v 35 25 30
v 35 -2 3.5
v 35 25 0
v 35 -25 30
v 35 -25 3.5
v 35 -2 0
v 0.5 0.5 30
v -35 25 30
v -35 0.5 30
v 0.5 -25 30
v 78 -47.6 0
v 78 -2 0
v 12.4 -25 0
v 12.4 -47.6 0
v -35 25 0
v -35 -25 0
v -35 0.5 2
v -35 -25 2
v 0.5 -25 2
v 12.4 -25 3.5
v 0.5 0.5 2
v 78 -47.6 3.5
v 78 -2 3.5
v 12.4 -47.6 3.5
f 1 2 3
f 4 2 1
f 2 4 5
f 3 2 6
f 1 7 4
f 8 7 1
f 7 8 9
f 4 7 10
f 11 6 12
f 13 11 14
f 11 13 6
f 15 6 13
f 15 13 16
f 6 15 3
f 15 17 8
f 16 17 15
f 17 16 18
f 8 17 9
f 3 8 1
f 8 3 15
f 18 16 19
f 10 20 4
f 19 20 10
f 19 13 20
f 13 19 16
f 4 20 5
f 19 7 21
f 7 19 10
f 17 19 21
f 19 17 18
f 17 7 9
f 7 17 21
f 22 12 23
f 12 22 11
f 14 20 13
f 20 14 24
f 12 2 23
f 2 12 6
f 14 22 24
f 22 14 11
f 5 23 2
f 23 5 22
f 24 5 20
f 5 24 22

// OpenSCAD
// Two-part enclosure for small electronics board (e.g., Arduino-based temp logger)
// Both parts printed in the same file, side by side on the bed, 10 mm gap.

// ---------- Parameters ----------
box_x      = 70;    // box outer size in X (mm)
box_y      = 50;    // box outer size in Y (mm)
box_z      = 30;    // box outer size in Z (mm)
box_wall   = 2;     // box wall thickness (mm)
box_floor  = 2;     // box floor thickness (mm)

lip_w      = 65.6;  // lid lip outer size in X (mm)
lip_d      = 45.6;  // lid lip outer size in Y (mm)
lip_h      = 1.5;   // lid lip thickness / wall height (mm)
plate_t    = 2;     // lid plate thickness (mm)

clearance  = 0.2;   // clearance between lip outer and box opening (mm)
gap        = 10;    // gap between box and lid on the bed (mm)

eps        = 0.5;   // cutter overshoot past faces (mm)

// ---------- Derived ----------
lip_x0 = -lip_w / 2 + clearance;
lip_y0 = -lip_d / 2 + clearance;
lip_x1 =  lip_w / 2 - clearance;
lip_y1 =  lip_d / 2 - clearance;

// ---------- Model ----------
union() {
    // Part 1: Box (open top)
    translate([-box_x / 2, -box_y / 2, 0])
        difference() {
            cube([box_x, box_y, box_z]);
            translate([-box_x / 2 - eps, -box_y / 2 - eps, box_floor])
                cube([box_x + 2 * eps, box_y + 2 * eps, box_z - box_floor + eps]);
        }

    // Part 2: Lid, printed upside down
    translate([box_x / 2 + gap, -box_y / 2, 0])
        union() {
            // Plate lying on the bed
            translate([lip_x0, lip_y0, 0])
                cube([lip_w, lip_d, plate_t]);

            // Rectangular lip on top of the plate (overlaps box opening)
            translate([lip_x0, lip_y0, plate_t])
                cube([lip_w, lip_d, lip_h]);
        }
}
